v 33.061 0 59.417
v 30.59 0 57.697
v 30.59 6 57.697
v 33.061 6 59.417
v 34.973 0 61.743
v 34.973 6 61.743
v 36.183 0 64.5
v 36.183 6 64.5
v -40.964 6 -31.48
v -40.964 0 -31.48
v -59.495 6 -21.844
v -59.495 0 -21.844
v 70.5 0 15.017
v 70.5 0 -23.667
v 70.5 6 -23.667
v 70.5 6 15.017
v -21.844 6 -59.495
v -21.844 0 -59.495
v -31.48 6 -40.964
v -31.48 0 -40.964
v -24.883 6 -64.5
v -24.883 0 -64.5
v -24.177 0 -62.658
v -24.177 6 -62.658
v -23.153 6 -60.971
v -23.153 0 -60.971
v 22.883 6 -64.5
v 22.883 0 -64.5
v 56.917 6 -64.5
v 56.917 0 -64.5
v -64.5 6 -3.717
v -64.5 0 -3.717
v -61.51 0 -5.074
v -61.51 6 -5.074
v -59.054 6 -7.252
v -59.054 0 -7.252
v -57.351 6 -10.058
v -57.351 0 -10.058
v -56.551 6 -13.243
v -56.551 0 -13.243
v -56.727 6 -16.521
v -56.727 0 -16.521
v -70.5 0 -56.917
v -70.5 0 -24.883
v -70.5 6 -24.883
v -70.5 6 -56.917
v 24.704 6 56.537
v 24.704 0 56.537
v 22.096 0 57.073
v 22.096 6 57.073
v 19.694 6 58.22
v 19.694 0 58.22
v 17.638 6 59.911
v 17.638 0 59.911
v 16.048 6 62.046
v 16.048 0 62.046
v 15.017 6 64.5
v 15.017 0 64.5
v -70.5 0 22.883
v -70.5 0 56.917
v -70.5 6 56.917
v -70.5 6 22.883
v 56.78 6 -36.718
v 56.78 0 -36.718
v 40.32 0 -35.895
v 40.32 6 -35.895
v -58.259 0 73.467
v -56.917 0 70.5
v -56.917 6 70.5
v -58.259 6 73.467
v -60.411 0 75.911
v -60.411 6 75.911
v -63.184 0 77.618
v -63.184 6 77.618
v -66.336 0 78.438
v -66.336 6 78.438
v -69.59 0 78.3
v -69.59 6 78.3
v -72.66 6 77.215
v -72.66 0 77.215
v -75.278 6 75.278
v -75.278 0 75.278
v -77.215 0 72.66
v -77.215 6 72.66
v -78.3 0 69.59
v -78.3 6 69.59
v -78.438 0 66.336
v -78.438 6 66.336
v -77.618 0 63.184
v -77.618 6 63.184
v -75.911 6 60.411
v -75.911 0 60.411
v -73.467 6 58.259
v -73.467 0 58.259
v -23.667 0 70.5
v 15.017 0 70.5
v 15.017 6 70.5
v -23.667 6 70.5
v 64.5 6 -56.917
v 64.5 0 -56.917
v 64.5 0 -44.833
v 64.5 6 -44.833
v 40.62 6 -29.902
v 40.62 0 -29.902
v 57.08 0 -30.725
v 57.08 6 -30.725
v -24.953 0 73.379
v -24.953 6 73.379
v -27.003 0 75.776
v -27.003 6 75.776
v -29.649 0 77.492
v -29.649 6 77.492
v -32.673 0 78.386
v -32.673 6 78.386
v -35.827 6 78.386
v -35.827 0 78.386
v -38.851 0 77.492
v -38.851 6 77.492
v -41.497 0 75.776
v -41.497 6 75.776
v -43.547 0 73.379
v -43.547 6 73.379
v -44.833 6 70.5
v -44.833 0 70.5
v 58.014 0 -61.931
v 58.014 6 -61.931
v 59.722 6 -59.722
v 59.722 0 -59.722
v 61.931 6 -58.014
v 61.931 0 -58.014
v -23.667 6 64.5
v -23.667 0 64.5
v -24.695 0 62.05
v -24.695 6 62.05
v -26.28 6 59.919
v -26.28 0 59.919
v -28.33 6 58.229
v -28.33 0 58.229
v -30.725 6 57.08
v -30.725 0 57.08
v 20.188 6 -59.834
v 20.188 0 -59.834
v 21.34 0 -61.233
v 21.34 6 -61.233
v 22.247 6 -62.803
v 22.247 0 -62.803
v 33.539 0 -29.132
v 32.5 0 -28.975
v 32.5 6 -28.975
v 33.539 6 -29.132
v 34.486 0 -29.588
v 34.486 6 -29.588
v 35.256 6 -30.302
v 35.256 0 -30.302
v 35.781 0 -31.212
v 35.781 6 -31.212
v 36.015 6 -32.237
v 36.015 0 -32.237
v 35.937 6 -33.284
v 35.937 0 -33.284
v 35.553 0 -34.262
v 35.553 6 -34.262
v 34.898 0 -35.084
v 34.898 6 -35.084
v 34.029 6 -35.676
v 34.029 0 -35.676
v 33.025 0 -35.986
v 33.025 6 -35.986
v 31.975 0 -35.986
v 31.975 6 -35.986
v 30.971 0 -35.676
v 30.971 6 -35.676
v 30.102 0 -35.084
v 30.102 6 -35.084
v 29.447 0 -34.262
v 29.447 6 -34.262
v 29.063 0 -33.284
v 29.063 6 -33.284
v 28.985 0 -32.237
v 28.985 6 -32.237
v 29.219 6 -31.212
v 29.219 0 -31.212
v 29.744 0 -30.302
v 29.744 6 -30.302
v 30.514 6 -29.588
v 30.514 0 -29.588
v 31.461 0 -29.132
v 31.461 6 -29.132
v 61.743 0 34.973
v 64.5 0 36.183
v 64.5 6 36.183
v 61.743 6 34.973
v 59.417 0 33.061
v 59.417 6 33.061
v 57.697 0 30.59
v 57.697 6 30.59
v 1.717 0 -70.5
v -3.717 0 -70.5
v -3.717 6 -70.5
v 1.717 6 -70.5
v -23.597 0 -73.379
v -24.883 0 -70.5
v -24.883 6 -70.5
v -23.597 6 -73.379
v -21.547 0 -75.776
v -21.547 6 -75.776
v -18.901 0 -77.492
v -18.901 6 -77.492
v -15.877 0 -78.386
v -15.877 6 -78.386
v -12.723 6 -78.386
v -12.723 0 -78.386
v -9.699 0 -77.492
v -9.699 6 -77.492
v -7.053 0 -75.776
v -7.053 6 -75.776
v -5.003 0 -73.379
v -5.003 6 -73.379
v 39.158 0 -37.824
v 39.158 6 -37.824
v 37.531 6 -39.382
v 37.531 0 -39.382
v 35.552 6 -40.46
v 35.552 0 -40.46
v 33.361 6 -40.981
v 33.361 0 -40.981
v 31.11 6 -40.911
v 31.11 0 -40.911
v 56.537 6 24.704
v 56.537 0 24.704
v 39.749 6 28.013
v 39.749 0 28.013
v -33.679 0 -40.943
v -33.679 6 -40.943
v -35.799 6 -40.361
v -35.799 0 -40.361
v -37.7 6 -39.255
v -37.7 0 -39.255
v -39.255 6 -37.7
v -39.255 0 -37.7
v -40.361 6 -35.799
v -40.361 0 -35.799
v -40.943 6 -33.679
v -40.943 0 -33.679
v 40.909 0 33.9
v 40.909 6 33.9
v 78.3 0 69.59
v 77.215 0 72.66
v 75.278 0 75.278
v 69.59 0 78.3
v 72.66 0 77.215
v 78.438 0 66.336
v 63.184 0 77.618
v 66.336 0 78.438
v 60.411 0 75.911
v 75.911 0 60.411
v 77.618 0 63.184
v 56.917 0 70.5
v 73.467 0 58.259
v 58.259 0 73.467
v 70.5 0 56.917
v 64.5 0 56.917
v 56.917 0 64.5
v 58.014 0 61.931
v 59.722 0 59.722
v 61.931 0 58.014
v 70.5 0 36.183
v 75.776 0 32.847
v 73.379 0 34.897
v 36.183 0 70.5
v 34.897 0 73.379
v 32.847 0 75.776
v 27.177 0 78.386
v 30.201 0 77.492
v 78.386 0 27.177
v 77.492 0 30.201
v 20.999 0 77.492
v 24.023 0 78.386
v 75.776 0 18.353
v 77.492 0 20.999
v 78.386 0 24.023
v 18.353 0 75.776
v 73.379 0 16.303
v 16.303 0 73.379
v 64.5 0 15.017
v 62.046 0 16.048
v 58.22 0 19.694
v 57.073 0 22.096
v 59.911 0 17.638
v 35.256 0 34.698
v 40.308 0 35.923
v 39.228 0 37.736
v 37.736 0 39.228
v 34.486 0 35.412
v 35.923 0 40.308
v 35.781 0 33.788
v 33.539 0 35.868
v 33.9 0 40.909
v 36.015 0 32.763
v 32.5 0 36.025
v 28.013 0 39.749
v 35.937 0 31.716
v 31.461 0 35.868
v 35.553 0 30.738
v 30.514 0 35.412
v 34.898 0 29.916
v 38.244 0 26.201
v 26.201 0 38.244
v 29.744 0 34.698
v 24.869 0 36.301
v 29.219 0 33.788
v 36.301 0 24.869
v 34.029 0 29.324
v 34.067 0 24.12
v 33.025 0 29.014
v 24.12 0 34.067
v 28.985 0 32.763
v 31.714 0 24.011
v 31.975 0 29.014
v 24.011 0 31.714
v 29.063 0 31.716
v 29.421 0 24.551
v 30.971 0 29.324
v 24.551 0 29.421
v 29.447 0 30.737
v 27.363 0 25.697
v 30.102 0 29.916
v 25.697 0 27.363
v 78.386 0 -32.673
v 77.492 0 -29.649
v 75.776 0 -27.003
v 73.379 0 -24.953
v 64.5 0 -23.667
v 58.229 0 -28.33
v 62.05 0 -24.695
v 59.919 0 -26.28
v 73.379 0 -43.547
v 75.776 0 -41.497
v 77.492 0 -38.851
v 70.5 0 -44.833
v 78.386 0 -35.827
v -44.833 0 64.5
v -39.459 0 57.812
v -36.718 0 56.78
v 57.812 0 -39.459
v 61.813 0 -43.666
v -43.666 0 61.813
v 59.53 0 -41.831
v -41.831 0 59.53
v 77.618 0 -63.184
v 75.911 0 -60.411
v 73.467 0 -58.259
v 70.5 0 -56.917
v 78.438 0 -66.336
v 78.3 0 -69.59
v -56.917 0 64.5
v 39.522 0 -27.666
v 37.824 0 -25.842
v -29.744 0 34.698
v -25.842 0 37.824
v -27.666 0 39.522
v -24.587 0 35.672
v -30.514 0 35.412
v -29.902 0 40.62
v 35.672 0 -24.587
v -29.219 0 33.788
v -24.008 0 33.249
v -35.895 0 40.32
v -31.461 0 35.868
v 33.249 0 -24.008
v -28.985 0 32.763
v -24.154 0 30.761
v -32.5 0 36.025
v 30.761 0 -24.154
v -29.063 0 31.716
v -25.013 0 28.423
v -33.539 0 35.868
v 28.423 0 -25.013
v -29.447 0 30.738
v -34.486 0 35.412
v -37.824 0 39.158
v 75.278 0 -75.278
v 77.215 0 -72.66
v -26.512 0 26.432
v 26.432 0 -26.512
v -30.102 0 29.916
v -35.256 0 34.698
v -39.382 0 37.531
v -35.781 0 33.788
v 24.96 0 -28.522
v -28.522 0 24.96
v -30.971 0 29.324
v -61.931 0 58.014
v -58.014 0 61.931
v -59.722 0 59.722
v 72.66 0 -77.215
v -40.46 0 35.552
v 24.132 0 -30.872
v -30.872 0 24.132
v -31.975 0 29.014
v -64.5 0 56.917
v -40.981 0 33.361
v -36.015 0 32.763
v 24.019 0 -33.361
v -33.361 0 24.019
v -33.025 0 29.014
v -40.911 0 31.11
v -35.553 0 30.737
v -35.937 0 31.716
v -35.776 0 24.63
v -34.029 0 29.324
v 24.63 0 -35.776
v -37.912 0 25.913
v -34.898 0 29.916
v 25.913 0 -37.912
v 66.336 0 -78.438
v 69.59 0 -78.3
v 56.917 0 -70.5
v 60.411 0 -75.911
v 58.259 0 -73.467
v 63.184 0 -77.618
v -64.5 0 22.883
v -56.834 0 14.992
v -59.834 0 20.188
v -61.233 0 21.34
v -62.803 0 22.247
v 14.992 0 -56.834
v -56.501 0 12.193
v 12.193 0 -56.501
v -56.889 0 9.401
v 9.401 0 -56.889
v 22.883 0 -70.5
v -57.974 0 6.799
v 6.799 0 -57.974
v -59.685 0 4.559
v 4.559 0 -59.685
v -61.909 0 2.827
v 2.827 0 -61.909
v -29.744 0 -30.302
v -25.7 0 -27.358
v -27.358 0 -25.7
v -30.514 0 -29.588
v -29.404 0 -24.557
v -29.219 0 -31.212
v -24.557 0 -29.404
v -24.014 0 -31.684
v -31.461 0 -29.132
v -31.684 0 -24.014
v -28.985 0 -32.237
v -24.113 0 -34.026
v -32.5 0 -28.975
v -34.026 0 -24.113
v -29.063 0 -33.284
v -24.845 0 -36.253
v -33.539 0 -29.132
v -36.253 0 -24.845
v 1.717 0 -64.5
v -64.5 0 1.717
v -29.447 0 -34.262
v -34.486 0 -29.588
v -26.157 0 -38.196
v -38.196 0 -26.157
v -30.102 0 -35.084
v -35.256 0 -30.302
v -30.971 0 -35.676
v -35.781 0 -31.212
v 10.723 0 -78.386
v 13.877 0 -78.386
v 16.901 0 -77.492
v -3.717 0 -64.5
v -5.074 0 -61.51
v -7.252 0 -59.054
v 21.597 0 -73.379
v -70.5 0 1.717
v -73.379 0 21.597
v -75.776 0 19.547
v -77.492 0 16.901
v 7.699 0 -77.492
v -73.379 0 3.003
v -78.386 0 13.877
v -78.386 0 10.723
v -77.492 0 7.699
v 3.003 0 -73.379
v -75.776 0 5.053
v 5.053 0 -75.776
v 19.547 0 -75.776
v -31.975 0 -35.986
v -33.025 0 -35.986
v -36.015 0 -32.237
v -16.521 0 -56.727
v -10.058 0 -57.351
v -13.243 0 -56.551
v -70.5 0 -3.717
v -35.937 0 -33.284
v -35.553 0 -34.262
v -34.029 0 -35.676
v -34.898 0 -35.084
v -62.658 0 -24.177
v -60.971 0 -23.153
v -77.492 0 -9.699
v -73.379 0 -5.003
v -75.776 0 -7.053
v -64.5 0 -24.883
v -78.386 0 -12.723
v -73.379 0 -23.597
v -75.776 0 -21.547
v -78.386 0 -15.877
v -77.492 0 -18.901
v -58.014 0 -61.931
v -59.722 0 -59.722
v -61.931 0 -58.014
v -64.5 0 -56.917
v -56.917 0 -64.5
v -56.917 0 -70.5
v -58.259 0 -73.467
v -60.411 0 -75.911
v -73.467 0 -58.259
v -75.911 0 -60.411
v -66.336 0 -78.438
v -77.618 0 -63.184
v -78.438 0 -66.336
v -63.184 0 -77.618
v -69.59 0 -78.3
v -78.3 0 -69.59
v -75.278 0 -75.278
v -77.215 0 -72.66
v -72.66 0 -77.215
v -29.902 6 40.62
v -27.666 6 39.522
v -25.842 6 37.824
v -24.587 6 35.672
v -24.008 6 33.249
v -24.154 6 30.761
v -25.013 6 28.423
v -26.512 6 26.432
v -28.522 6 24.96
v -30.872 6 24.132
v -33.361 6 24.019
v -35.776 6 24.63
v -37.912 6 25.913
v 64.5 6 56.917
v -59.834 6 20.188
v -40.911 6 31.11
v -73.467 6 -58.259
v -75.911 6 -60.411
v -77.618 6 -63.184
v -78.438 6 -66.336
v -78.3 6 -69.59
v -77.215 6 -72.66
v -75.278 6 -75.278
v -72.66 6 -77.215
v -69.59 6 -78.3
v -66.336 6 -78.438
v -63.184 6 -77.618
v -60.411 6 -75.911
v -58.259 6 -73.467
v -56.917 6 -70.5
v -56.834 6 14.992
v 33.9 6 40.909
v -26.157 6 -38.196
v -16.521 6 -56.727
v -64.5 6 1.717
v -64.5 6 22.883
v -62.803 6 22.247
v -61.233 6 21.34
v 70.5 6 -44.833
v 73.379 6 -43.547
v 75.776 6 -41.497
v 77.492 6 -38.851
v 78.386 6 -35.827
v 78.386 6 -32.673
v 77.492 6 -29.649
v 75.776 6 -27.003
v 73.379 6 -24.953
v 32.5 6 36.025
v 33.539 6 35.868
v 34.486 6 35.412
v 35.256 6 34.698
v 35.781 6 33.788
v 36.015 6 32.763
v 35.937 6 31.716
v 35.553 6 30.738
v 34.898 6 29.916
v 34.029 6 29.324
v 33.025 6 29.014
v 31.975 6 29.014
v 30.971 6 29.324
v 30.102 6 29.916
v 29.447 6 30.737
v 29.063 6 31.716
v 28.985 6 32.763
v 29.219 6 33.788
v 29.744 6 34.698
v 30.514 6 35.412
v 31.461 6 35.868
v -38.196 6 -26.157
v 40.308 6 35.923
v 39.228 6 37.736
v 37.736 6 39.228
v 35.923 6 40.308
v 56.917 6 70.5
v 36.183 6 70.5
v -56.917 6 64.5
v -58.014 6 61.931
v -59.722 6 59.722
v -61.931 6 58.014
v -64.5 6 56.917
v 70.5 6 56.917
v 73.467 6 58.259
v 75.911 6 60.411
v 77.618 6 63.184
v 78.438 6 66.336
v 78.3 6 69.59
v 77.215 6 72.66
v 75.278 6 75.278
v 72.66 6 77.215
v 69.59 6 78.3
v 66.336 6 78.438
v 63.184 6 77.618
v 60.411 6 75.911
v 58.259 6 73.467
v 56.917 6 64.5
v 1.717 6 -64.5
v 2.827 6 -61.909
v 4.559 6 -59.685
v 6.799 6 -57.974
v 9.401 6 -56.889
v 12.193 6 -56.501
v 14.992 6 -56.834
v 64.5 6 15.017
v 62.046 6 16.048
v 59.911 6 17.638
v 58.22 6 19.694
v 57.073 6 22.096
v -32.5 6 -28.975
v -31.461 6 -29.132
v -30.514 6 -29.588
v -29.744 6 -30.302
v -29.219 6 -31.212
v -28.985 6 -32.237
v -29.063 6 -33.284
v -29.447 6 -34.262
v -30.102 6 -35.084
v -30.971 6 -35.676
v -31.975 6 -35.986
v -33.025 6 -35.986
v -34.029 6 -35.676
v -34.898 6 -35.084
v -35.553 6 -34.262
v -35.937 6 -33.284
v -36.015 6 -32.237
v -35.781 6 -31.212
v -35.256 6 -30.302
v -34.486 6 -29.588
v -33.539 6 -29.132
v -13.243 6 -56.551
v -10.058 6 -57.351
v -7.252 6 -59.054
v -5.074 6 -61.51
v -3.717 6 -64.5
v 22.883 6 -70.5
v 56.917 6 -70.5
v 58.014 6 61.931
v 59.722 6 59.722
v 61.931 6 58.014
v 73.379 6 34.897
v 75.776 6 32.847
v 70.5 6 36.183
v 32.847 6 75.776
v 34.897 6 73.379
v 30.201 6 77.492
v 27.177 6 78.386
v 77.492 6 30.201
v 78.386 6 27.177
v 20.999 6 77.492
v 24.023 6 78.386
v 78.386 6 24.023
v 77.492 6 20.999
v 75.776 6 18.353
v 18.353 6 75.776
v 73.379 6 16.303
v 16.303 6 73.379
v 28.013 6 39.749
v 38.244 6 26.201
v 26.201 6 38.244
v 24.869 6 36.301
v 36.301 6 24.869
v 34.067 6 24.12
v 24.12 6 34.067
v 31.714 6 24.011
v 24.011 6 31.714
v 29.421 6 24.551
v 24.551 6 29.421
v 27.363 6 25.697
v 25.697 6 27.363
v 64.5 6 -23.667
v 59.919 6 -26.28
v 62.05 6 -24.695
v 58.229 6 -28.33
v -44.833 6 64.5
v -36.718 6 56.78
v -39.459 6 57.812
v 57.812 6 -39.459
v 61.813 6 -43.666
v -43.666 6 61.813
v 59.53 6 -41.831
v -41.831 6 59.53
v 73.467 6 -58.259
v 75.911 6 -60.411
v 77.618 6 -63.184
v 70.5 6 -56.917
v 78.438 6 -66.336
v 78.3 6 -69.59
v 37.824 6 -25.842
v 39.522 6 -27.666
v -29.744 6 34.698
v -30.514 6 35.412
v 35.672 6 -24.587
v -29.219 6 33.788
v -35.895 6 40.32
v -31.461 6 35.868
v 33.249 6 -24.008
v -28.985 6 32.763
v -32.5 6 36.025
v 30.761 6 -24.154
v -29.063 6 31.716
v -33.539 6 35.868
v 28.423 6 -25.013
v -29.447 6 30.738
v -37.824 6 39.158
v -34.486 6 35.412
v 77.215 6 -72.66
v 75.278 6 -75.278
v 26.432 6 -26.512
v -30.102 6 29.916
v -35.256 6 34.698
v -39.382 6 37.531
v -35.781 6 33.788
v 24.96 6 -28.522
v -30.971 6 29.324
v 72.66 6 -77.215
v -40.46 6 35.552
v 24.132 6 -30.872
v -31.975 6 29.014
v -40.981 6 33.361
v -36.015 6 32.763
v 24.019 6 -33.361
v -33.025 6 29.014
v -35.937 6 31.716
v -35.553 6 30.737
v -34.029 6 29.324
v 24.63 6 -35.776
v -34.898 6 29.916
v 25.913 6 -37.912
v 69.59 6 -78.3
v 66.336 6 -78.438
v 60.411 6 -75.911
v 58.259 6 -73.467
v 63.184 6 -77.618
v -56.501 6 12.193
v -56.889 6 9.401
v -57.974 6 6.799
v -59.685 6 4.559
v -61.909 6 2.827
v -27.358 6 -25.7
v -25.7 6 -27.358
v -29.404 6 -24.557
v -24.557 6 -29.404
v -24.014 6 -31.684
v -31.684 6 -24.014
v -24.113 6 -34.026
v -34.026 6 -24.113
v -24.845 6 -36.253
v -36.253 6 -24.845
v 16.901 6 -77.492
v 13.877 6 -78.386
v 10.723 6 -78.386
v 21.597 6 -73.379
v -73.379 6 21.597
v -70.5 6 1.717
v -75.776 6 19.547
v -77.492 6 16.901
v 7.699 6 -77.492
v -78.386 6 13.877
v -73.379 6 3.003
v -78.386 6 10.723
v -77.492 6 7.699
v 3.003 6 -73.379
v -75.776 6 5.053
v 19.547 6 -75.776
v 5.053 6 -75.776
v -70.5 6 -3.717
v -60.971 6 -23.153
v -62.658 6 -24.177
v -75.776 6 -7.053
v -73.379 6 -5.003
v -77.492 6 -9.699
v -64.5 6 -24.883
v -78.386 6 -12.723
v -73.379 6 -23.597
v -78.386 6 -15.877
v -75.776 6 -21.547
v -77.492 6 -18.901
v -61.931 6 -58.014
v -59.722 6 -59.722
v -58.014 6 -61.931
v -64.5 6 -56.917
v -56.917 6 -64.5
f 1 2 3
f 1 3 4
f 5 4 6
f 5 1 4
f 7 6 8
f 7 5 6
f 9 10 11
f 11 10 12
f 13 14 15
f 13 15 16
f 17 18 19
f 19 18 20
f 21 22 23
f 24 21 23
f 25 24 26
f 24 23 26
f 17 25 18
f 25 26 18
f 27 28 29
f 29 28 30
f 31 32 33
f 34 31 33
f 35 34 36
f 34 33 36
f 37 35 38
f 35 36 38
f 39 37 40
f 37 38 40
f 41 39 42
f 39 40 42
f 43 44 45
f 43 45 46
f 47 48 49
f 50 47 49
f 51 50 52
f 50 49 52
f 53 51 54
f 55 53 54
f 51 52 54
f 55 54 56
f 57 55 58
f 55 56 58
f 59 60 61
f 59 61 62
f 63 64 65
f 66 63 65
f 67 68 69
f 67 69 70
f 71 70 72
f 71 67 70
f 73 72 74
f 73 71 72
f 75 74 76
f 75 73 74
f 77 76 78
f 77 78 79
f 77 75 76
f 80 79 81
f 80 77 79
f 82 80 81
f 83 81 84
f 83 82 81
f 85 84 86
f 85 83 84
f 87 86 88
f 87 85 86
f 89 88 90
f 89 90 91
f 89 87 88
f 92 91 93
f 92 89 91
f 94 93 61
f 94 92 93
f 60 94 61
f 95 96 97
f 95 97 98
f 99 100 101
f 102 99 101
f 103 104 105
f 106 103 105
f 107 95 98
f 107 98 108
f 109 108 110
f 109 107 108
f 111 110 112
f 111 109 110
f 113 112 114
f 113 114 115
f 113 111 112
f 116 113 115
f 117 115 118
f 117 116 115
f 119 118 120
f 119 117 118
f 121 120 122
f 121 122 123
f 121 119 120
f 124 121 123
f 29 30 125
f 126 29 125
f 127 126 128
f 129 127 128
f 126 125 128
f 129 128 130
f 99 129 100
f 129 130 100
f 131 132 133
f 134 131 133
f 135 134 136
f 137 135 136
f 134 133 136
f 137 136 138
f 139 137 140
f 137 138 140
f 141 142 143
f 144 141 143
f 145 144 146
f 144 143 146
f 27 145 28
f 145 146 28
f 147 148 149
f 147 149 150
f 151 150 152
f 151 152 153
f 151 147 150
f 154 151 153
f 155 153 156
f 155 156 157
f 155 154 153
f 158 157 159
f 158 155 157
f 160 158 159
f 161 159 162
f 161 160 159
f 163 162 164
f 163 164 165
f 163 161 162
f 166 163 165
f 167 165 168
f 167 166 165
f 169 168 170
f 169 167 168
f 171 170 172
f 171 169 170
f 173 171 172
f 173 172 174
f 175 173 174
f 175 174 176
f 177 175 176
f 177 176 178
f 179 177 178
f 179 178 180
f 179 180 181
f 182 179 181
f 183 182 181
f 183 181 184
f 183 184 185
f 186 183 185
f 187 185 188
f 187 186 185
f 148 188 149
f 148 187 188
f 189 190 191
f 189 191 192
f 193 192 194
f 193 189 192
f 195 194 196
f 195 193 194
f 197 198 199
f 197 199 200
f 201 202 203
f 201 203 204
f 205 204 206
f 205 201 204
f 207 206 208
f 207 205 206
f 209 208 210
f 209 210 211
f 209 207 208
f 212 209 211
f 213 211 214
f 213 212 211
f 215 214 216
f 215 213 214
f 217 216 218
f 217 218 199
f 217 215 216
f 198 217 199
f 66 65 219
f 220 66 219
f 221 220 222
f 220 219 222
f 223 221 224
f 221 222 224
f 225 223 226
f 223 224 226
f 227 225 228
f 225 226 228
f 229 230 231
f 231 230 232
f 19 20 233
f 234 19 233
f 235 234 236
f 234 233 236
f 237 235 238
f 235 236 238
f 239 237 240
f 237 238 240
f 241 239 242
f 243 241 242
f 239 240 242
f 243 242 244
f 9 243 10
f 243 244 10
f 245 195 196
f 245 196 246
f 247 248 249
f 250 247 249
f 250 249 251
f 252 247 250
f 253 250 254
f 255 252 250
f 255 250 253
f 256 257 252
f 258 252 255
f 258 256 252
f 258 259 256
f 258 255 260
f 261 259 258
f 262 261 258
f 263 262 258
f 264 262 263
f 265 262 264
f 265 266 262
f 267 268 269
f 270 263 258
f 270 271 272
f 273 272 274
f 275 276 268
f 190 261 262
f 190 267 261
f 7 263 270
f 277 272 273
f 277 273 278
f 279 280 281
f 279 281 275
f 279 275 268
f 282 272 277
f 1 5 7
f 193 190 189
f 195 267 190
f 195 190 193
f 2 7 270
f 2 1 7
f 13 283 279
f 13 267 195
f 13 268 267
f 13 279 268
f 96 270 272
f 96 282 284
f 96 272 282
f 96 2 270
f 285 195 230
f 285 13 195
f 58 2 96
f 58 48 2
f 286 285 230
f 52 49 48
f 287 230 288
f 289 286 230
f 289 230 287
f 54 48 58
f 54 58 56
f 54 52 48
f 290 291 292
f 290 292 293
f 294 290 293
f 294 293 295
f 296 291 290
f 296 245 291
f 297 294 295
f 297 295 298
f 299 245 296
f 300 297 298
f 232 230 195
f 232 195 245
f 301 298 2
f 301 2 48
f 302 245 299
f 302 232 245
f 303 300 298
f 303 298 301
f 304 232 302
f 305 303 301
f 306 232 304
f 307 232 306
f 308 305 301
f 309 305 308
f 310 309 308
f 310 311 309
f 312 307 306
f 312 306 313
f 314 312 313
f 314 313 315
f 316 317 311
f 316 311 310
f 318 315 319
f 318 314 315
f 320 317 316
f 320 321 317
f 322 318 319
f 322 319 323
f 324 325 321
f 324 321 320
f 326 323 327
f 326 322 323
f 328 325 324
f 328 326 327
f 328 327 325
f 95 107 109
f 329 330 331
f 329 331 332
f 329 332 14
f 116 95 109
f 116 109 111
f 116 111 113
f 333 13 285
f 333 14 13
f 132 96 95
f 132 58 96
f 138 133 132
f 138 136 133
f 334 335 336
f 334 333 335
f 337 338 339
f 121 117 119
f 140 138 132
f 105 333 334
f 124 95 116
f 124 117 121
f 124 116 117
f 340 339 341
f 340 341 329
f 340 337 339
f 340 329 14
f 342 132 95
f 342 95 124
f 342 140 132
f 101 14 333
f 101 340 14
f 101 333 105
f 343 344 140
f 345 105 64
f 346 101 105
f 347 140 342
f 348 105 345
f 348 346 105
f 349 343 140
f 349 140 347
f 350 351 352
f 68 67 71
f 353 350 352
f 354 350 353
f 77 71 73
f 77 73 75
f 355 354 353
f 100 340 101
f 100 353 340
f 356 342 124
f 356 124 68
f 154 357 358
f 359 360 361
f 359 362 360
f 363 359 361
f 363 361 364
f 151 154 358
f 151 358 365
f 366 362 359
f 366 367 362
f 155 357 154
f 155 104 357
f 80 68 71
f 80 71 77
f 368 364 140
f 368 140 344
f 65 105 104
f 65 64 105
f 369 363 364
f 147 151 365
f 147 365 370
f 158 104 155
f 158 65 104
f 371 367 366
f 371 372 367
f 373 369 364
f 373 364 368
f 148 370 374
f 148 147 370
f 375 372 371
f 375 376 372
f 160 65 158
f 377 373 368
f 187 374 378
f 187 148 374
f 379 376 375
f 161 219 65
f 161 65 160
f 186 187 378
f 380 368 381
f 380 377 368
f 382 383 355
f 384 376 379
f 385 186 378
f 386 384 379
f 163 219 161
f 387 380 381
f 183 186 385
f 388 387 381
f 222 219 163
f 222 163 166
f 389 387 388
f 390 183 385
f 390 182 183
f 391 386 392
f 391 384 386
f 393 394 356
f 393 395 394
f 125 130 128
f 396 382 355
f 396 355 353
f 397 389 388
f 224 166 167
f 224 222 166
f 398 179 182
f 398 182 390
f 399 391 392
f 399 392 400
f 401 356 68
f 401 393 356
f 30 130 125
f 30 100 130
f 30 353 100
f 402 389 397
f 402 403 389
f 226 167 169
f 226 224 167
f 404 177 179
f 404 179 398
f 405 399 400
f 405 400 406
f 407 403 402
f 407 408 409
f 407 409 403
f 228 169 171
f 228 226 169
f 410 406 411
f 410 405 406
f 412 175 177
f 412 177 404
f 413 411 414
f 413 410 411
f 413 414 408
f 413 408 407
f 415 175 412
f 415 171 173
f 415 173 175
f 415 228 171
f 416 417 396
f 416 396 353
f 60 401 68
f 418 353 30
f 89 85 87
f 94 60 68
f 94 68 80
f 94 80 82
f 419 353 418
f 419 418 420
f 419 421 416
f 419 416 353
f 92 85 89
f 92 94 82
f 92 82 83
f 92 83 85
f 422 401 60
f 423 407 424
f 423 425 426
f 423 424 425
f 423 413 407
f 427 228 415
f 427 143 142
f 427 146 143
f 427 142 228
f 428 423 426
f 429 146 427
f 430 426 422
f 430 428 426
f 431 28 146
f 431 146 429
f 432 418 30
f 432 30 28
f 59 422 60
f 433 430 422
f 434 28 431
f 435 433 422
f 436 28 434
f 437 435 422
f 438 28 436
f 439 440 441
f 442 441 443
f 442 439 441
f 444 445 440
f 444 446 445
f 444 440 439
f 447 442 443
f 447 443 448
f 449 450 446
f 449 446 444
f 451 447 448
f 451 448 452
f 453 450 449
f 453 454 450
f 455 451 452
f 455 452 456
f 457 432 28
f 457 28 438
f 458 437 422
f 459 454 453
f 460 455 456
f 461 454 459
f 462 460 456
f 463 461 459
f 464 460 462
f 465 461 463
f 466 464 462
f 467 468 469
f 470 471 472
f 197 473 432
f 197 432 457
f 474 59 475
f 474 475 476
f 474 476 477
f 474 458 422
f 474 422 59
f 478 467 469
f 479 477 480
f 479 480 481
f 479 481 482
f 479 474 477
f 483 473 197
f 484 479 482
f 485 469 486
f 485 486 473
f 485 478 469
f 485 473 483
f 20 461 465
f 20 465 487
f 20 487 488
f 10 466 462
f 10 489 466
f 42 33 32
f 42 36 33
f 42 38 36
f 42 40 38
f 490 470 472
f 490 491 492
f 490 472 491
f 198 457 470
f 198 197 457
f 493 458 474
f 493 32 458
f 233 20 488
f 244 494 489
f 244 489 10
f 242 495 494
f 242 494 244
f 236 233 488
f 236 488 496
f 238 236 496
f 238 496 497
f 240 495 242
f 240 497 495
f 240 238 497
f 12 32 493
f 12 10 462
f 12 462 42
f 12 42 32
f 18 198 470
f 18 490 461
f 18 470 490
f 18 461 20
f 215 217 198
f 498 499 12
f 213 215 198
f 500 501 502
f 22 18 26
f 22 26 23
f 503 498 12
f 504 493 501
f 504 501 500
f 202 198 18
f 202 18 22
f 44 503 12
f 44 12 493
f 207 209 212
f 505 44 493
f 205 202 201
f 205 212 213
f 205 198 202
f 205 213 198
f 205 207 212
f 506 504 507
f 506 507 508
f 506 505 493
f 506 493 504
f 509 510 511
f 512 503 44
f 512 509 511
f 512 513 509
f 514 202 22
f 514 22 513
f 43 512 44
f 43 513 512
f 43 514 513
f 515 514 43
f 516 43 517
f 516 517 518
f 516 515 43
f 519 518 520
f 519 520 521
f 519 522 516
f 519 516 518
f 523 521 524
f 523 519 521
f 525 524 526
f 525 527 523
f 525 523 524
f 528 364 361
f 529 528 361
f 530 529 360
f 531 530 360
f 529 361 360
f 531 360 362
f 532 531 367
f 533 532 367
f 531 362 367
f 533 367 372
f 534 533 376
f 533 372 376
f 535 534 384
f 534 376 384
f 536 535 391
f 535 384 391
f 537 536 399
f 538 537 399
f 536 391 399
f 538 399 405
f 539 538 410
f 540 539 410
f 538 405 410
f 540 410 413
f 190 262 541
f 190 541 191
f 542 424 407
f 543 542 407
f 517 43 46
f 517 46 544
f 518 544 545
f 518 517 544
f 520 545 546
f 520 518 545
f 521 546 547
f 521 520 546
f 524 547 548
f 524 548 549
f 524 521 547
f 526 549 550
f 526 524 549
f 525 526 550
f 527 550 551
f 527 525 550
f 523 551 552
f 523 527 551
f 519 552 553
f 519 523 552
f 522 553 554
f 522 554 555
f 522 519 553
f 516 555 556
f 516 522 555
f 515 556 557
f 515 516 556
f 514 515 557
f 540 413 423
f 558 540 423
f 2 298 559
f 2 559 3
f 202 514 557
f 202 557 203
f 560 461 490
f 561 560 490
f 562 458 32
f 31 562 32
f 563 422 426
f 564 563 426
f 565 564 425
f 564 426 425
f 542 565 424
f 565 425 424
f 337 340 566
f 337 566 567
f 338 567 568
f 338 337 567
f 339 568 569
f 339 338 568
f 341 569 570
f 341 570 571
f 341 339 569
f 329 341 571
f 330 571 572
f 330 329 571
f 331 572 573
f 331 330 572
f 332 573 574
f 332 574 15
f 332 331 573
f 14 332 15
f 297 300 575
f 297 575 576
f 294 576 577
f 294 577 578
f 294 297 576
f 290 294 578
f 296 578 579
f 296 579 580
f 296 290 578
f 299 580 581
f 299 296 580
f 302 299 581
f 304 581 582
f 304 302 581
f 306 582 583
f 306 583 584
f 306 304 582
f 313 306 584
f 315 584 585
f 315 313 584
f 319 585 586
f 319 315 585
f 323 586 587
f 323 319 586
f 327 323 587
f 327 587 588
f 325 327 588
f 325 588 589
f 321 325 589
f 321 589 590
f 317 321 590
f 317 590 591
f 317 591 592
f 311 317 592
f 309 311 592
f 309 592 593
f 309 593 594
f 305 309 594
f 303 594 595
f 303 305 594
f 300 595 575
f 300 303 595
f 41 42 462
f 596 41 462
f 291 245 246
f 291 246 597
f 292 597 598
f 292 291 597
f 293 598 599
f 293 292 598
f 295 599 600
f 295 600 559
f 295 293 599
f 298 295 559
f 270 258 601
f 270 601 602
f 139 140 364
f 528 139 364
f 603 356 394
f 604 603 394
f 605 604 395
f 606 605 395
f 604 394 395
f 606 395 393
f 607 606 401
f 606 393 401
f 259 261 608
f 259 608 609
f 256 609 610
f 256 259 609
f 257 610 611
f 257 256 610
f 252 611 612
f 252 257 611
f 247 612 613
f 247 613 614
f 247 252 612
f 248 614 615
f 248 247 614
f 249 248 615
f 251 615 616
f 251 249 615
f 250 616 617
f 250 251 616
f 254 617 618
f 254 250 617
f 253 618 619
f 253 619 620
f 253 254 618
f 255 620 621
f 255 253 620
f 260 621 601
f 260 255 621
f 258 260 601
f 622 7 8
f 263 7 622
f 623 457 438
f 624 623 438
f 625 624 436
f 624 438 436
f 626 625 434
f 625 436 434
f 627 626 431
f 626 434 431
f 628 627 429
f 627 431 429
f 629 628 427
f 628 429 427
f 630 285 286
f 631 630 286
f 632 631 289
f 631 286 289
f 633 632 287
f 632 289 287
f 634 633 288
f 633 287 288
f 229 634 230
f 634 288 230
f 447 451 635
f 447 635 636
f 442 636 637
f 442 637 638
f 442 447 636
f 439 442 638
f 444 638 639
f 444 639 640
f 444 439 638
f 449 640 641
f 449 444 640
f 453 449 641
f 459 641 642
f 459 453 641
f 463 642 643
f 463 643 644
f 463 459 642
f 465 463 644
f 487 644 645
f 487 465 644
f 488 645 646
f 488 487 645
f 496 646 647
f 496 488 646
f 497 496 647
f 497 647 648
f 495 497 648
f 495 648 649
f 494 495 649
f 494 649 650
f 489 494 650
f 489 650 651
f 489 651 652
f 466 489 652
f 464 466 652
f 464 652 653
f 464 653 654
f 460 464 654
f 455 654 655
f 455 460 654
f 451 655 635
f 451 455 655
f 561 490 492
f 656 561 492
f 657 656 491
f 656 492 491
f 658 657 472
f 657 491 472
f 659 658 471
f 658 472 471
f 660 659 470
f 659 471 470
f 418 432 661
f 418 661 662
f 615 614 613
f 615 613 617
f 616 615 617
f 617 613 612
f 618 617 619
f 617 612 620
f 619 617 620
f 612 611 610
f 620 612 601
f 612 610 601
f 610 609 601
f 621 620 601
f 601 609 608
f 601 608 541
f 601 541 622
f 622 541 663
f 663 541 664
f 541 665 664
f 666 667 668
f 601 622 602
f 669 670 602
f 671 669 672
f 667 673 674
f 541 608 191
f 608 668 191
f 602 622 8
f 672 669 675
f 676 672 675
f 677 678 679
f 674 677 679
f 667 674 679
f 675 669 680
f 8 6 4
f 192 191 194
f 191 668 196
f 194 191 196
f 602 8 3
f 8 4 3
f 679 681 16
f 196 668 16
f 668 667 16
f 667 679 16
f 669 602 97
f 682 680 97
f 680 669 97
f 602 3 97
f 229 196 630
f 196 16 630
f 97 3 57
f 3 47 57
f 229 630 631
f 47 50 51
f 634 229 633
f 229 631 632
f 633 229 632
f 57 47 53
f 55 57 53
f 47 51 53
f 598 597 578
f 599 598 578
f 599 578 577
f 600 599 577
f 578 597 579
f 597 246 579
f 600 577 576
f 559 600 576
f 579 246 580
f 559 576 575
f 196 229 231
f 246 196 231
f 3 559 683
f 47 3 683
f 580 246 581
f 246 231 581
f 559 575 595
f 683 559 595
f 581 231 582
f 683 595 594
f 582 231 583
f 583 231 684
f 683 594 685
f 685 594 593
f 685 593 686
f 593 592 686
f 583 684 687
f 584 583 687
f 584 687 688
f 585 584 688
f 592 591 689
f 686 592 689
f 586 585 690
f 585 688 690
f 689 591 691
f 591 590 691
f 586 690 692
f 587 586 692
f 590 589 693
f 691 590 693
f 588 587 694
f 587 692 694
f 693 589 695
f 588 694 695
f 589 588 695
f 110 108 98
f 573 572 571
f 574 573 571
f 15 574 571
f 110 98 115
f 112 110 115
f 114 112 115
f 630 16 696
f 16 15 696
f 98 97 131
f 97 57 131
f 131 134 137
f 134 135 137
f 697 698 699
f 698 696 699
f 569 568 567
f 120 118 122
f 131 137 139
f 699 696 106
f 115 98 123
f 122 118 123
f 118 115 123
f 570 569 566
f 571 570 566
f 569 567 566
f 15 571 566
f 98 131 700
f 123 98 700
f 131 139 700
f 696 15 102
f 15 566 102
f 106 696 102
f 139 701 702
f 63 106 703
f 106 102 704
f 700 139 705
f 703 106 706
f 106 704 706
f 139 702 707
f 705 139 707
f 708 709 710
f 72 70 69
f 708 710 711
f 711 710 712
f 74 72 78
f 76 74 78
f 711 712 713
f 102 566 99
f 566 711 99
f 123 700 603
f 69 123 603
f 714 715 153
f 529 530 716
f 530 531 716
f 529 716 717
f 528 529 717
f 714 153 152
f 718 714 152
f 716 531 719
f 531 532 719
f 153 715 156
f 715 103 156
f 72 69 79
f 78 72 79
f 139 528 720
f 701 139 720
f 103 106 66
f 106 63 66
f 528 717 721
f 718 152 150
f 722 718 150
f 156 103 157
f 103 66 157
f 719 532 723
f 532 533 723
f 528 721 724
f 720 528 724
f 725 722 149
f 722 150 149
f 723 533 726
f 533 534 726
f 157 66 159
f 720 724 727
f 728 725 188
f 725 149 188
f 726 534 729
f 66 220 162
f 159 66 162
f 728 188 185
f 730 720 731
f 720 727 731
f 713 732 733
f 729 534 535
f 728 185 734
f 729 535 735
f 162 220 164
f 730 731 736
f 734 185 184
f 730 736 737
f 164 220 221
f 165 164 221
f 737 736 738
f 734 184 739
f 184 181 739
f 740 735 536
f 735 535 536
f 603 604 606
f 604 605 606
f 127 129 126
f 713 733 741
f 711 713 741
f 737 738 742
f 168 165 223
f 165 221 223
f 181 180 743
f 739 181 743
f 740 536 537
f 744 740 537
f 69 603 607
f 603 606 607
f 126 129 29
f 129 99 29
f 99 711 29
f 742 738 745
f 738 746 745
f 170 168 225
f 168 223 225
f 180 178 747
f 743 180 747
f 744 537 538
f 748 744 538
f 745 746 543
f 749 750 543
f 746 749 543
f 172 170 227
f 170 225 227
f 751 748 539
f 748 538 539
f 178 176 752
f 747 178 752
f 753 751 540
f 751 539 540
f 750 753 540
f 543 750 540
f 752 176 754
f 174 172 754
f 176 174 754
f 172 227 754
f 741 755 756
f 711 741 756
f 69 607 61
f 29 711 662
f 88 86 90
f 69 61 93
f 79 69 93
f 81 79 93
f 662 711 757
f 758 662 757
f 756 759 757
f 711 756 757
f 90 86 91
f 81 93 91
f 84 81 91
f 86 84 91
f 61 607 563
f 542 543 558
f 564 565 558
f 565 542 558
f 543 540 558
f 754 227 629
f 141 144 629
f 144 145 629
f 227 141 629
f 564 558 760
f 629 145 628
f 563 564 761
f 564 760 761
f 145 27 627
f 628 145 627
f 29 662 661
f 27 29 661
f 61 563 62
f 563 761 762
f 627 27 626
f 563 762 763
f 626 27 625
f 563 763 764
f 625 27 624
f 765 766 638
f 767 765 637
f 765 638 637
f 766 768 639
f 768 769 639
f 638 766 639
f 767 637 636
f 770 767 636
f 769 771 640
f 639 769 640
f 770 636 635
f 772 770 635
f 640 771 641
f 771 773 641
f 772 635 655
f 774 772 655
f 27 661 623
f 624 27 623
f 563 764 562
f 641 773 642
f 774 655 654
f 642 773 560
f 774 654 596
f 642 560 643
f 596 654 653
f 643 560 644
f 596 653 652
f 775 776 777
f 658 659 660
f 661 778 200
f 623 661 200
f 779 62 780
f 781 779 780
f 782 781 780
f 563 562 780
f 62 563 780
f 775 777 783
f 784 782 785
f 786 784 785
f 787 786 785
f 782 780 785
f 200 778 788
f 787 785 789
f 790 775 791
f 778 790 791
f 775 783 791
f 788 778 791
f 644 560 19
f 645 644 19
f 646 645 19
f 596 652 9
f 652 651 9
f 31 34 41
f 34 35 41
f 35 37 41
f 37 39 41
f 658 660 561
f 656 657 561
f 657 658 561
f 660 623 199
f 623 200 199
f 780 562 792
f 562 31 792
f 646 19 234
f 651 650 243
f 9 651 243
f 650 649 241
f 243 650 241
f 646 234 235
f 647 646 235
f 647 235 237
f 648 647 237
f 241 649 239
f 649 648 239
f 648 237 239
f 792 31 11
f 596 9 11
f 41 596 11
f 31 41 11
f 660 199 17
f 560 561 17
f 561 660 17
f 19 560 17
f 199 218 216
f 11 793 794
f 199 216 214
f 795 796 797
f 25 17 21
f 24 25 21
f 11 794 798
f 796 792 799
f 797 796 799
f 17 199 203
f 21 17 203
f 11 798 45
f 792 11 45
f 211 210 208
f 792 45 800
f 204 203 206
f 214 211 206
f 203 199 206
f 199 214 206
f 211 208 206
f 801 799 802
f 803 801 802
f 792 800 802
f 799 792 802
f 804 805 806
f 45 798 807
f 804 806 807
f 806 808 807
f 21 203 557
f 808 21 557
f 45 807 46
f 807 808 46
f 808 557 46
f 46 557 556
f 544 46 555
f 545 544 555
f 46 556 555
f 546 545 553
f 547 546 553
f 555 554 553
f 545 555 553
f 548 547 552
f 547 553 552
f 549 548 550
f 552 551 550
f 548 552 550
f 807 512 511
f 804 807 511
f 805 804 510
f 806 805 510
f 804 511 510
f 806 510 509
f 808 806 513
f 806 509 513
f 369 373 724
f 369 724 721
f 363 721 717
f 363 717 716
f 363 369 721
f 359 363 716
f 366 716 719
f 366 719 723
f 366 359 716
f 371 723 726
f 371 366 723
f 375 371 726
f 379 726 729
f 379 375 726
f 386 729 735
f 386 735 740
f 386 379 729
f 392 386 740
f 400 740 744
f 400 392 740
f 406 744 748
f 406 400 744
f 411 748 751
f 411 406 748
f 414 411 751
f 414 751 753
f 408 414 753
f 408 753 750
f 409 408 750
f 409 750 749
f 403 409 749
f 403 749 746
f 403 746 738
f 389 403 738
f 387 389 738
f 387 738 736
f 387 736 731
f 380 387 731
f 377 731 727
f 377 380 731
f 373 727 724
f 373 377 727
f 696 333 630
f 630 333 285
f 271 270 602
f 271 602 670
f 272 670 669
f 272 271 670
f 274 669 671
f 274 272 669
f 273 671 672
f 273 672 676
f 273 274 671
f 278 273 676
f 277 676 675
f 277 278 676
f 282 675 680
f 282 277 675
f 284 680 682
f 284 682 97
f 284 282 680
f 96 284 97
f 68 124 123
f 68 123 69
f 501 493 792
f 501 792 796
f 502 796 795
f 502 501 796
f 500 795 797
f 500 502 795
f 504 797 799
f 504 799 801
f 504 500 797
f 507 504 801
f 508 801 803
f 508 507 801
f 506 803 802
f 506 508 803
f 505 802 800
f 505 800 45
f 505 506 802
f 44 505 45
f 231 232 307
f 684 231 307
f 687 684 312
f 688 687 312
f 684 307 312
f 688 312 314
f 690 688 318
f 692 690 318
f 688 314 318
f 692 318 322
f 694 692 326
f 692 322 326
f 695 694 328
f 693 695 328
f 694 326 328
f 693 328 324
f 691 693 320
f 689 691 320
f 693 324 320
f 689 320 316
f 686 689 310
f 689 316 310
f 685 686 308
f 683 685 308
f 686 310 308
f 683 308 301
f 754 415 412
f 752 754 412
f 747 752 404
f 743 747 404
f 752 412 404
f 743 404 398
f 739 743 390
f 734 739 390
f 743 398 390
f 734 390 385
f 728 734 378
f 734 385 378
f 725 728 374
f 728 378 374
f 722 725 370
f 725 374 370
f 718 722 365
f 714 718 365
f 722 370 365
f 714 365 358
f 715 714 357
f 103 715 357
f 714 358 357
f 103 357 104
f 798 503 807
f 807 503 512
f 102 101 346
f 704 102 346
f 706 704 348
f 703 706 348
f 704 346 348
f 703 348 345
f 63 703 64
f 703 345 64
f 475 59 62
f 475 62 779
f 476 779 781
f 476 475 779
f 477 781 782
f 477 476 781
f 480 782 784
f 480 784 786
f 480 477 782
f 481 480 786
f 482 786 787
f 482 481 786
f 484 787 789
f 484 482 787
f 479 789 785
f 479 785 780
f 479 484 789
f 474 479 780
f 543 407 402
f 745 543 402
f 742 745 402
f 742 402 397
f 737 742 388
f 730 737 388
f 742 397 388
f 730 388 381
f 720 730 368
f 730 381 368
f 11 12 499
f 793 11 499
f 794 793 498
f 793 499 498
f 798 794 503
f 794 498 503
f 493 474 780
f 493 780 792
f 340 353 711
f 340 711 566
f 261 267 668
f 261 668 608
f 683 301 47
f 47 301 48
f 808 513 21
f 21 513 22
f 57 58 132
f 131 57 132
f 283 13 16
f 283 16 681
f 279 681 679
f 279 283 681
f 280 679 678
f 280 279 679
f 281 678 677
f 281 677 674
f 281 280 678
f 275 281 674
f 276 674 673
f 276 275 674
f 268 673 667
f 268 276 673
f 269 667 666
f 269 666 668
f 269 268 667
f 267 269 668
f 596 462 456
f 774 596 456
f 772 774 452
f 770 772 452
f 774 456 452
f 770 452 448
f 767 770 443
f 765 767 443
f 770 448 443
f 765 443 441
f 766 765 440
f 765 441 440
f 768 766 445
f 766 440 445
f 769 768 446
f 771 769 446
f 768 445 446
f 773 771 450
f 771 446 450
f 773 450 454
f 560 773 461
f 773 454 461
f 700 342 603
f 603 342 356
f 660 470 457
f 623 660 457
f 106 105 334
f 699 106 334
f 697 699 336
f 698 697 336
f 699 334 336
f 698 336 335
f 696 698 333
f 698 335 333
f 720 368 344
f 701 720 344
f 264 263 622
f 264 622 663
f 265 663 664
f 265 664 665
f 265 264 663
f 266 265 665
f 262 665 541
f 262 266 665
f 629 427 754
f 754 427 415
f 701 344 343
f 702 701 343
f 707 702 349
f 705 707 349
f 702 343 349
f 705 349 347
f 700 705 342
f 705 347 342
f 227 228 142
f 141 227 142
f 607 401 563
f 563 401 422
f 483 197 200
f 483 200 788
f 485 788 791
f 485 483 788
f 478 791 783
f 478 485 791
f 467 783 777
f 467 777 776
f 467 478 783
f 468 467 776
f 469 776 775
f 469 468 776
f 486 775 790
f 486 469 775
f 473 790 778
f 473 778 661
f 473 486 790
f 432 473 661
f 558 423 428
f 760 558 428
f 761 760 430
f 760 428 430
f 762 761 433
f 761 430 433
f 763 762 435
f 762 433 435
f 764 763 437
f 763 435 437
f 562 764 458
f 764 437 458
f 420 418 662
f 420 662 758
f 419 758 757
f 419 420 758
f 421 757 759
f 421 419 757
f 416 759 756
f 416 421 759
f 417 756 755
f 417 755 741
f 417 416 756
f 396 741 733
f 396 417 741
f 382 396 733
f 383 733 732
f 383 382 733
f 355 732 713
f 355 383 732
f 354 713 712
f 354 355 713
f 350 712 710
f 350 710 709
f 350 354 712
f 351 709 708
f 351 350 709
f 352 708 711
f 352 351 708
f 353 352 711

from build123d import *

# Parameters (mm, degrees)
SKETCH1_R           = 3.525
BOSS_EXTRUDE1_DEPTH = 6


with BuildPart() as part:
    # Sketch1 → Boss-Extrude1 (new body)
    with BuildSketch(Plane(origin=(0, 0, 0), x_dir=(1, 0, 0), z_dir=(0, 1, 0))):
        with BuildLine():
            Line((-56.916994756, 70.5), (-24.883005244, 70.5))
            ThreePointArc((-24.883005244, 70.5), (-14.3, 78.5), (-3.716994756, 70.5))
            Line((-3.716994756, 70.5), (1.716994756, 70.5))
            ThreePointArc((1.716994756, 70.5), (12.3, 78.5), (22.883005244, 70.5))
            Line((22.883005244, 70.5), (56.916994756, 70.5))
            ThreePointArc((56.916994756, 70.5), (75.278174593, 75.278174593), (70.5, 56.916994756))
            Line((70.5, 56.916994756), (70.5, 44.833005244))
            ThreePointArc((70.5, 44.833005244), (78.5, 34.25), (70.5, 23.666994756))
            Line((70.5, 23.666994756), (70.5, -15.016994756))
            ThreePointArc((70.5, -15.016994756), (78.5, -25.6), (70.5, -36.183005244))
            Line((70.5, -36.183005244), (70.5, -56.916994756))
            ThreePointArc((70.5, -56.916994756), (75.278174593, -75.278174593), (56.916994756, -70.5))
            Line((56.916994756, -70.5), (36.183005244, -70.5))
            ThreePointArc((36.183005244, -70.5), (25.6, -78.5), (15.016994756, -70.5))
            Line((15.016994756, -70.5), (-23.666994756, -70.5))
            ThreePointArc((-23.666994756, -70.5), (-34.25, -78.5), (-44.833005244, -70.5))
            Line((-44.833005244, -70.5), (-56.916994756, -70.5))
            ThreePointArc((-56.916994756, -70.5), (-75.278174593, -75.278174593), (-70.5, -56.916994756))
            Line((-70.5, -56.916994756), (-70.5, -22.883005244))
            ThreePointArc((-70.5, -22.883005244), (-78.5, -12.3), (-70.5, -1.716994756))
            Line((-70.5, -1.716994756), (-70.5, 3.716994756))
            ThreePointArc((-70.5, 3.716994756), (-78.5, 14.3), (-70.5, 24.883005244))
            Line((-70.5, 24.883005244), (-70.5, 56.916994756))
            ThreePointArc((-70.5, 56.916994756), (-75.278174593, 75.278174593), (-56.916994756, 70.5))
        make_face()
        with Locations(Location((-32.5, 32.5, 0), (0, 0, 270))):
            Circle(SKETCH1_R, mode=Mode.SUBTRACT)
        with Locations(Location((32.5, 32.5, 0), (0, 0, 270))):
            Circle(SKETCH1_R, mode=Mode.SUBTRACT)
        with Locations(Location((32.5, -32.5, 0), (0, 0, 270))):
            Circle(SKETCH1_R, mode=Mode.SUBTRACT)
        with Locations(Location((-32.5, -32.5, 0), (0, 0, 270))):
            Circle(SKETCH1_R, mode=Mode.SUBTRACT)
        with BuildLine():
            Line((36.183005244, -64.5), (56.916994756, -64.5))
            ThreePointArc((56.916994756, -64.5), (59.721825407, -59.721825407), (64.5, -56.916994756))
            Line((64.5, -56.916994756), (64.5, -36.183005244))
            ThreePointArc((64.5, -36.183005244), (60.514437119, -34.097170779), (57.697103802, -30.590313229))
            Line((57.697103802, -30.590313229), (40.909272567, -33.899914244))
            ThreePointArc((40.909272567, -33.899914244), (38.52808531, -38.52808531), (33.899914244, -40.909272567))
            Line((33.899914244, -40.909272567), (30.590313229, -57.697103802))
            ThreePointArc((30.590313229, -57.697103802), (34.097170779, -60.514437119), (36.183005244, -64.5))
        make_face(mode=Mode.SUBTRACT)
        with BuildLine():
            Line((-56.916994756, 64.5), (-24.883005244, 64.5))
            ThreePointArc((-24.883005244, 64.5), (-23.702757073, 61.791396017), (-21.844148835, 59.49463815))
            Line((-21.844148835, 59.49463815), (-31.480193598, 40.963782836))
            ThreePointArc((-31.480193598, 40.963782836), (-38.52808531, 38.52808531), (-40.963782836, 31.480193598))
            Line((-40.963782836, 31.480193598), (-59.49463815, 21.844148835))
            ThreePointArc((-59.49463815, 21.844148835), (-61.791396017, 23.702757073), (-64.5, 24.883005244))
            Line((-64.5, 24.883005244), (-64.5, 56.916994756))
            ThreePointArc((-64.5, 56.916994756), (-59.721825407, 59.721825407), (-56.916994756, 64.5))
        make_face(mode=Mode.SUBTRACT)
        with BuildLine():
            Line((-64.5, -56.916994756), (-64.5, -22.883005244))
            ThreePointArc((-64.5, -22.883005244), (-61.999259001, -21.825851587), (-59.833621297, -20.188386247))
            Line((-59.833621297, -20.188386247), (-40.910840036, -31.10953429))
            ThreePointArc((-40.910840036, -31.10953429), (-39.986708997, -36.577353724), (-35.894744259, -40.319931996))
            Line((-35.894744259, -40.319931996), (-36.717766955, -56.780385909))
            ThreePointArc((-36.717766955, -56.780385909), (-41.831475725, -59.529979559), (-44.833005244, -64.5))
            Line((-44.833005244, -64.5), (-56.916994756, -64.5))
            ThreePointArc((-56.916994756, -64.5), (-59.721825407, -59.721825407), (-64.5, -56.916994756))
        make_face(mode=Mode.SUBTRACT)
        with BuildLine():
            Line((-3.716994756, 64.5), (1.716994756, 64.5))
            ThreePointArc((1.716994756, 64.5), (6.799259001, 57.974148413), (14.991767169, 56.834429715))
            Line((14.991767169, 56.834429715), (25.912915211, 37.911648453))
            ThreePointArc((25.912915211, 37.911648453), (28.422646276, 25.013291003), (40.619557697, 29.902230226))
            Line((40.619557697, 29.902230226), (57.080011611, 30.725252921))
            ThreePointArc((57.080011611, 30.725252921), (59.918524275, 26.279979559), (64.5, 23.666994756))
            Line((64.5, 23.666994756), (64.5, -15.016994756))
            ThreePointArc((64.5, -15.016994756), (59.002829221, -18.614437119), (56.536583679, -24.703616953))
            Line((56.536583679, -24.703616953), (39.748752444, -28.013217968))
            ThreePointArc((39.748752444, -28.013217968), (26.47191469, -26.47191469), (28.013217968, -39.748752444))
            Line((28.013217968, -39.748752444), (24.703616953, -56.536583679))
            ThreePointArc((24.703616953, -56.536583679), (18.614437119, -59.002829221), (15.016994756, -64.5))
            Line((15.016994756, -64.5), (-23.666994756, -64.5))
            ThreePointArc((-23.666994756, -64.5), (-26.279979559, -59.918524275), (-30.725252921, -57.080011611))
            Line((-30.725252921, -57.080011611), (-29.902230226, -40.619557697))
            ThreePointArc((-29.902230226, -40.619557697), (-25.013291003, -28.422646276), (-37.911648453, -25.912915211))
            Line((-37.911648453, -25.912915211), (-56.834429715, -14.991767169))
            ThreePointArc((-56.834429715, -14.991767169), (-57.974148413, -6.799259001), (-64.5, -1.716994756))
            Line((-64.5, -1.716994756), (-64.5, 3.716994756))
            ThreePointArc((-64.5, 3.716994756), (-58.097242927, 8.591396017), (-56.72652173, 16.520848028))
            Line((-56.72652173, 16.520848028), (-38.195666417, 26.156892791))
            ThreePointArc((-38.195666417, 26.156892791), (-26.47191469, 26.47191469), (-26.156892791, 38.195666417))
            Line((-26.156892791, 38.195666417), (-16.520848028, 56.72652173))
            ThreePointArc((-16.520848028, 56.72652173), (-8.591396017, 58.097242927), (-3.716994756, 64.5))
        make_face(mode=Mode.SUBTRACT)
        with BuildLine():
            Line((22.883005244, 64.5), (56.916994756, 64.5))
            ThreePointArc((56.916994756, 64.5), (59.721825407, 59.721825407), (64.5, 56.916994756))
            Line((64.5, 56.916994756), (64.5, 44.833005244))
            ThreePointArc((64.5, 44.833005244), (59.529979559, 41.831475725), (56.780385909, 36.717766955))
            Line((56.780385909, 36.717766955), (40.319931996, 35.894744259))
            ThreePointArc((40.319931996, 35.894744259), (36.577353724, 39.986708997), (31.10953429, 40.910840036))
            Line((31.10953429, 40.910840036), (20.188386247, 59.833621297))
            ThreePointArc((20.188386247, 59.833621297), (21.825851587, 61.999259001), (22.883005244, 64.5))
        make_face(mode=Mode.SUBTRACT)
    extrude(amount=BOSS_EXTRUDE1_DEPTH)


solid = part.part
